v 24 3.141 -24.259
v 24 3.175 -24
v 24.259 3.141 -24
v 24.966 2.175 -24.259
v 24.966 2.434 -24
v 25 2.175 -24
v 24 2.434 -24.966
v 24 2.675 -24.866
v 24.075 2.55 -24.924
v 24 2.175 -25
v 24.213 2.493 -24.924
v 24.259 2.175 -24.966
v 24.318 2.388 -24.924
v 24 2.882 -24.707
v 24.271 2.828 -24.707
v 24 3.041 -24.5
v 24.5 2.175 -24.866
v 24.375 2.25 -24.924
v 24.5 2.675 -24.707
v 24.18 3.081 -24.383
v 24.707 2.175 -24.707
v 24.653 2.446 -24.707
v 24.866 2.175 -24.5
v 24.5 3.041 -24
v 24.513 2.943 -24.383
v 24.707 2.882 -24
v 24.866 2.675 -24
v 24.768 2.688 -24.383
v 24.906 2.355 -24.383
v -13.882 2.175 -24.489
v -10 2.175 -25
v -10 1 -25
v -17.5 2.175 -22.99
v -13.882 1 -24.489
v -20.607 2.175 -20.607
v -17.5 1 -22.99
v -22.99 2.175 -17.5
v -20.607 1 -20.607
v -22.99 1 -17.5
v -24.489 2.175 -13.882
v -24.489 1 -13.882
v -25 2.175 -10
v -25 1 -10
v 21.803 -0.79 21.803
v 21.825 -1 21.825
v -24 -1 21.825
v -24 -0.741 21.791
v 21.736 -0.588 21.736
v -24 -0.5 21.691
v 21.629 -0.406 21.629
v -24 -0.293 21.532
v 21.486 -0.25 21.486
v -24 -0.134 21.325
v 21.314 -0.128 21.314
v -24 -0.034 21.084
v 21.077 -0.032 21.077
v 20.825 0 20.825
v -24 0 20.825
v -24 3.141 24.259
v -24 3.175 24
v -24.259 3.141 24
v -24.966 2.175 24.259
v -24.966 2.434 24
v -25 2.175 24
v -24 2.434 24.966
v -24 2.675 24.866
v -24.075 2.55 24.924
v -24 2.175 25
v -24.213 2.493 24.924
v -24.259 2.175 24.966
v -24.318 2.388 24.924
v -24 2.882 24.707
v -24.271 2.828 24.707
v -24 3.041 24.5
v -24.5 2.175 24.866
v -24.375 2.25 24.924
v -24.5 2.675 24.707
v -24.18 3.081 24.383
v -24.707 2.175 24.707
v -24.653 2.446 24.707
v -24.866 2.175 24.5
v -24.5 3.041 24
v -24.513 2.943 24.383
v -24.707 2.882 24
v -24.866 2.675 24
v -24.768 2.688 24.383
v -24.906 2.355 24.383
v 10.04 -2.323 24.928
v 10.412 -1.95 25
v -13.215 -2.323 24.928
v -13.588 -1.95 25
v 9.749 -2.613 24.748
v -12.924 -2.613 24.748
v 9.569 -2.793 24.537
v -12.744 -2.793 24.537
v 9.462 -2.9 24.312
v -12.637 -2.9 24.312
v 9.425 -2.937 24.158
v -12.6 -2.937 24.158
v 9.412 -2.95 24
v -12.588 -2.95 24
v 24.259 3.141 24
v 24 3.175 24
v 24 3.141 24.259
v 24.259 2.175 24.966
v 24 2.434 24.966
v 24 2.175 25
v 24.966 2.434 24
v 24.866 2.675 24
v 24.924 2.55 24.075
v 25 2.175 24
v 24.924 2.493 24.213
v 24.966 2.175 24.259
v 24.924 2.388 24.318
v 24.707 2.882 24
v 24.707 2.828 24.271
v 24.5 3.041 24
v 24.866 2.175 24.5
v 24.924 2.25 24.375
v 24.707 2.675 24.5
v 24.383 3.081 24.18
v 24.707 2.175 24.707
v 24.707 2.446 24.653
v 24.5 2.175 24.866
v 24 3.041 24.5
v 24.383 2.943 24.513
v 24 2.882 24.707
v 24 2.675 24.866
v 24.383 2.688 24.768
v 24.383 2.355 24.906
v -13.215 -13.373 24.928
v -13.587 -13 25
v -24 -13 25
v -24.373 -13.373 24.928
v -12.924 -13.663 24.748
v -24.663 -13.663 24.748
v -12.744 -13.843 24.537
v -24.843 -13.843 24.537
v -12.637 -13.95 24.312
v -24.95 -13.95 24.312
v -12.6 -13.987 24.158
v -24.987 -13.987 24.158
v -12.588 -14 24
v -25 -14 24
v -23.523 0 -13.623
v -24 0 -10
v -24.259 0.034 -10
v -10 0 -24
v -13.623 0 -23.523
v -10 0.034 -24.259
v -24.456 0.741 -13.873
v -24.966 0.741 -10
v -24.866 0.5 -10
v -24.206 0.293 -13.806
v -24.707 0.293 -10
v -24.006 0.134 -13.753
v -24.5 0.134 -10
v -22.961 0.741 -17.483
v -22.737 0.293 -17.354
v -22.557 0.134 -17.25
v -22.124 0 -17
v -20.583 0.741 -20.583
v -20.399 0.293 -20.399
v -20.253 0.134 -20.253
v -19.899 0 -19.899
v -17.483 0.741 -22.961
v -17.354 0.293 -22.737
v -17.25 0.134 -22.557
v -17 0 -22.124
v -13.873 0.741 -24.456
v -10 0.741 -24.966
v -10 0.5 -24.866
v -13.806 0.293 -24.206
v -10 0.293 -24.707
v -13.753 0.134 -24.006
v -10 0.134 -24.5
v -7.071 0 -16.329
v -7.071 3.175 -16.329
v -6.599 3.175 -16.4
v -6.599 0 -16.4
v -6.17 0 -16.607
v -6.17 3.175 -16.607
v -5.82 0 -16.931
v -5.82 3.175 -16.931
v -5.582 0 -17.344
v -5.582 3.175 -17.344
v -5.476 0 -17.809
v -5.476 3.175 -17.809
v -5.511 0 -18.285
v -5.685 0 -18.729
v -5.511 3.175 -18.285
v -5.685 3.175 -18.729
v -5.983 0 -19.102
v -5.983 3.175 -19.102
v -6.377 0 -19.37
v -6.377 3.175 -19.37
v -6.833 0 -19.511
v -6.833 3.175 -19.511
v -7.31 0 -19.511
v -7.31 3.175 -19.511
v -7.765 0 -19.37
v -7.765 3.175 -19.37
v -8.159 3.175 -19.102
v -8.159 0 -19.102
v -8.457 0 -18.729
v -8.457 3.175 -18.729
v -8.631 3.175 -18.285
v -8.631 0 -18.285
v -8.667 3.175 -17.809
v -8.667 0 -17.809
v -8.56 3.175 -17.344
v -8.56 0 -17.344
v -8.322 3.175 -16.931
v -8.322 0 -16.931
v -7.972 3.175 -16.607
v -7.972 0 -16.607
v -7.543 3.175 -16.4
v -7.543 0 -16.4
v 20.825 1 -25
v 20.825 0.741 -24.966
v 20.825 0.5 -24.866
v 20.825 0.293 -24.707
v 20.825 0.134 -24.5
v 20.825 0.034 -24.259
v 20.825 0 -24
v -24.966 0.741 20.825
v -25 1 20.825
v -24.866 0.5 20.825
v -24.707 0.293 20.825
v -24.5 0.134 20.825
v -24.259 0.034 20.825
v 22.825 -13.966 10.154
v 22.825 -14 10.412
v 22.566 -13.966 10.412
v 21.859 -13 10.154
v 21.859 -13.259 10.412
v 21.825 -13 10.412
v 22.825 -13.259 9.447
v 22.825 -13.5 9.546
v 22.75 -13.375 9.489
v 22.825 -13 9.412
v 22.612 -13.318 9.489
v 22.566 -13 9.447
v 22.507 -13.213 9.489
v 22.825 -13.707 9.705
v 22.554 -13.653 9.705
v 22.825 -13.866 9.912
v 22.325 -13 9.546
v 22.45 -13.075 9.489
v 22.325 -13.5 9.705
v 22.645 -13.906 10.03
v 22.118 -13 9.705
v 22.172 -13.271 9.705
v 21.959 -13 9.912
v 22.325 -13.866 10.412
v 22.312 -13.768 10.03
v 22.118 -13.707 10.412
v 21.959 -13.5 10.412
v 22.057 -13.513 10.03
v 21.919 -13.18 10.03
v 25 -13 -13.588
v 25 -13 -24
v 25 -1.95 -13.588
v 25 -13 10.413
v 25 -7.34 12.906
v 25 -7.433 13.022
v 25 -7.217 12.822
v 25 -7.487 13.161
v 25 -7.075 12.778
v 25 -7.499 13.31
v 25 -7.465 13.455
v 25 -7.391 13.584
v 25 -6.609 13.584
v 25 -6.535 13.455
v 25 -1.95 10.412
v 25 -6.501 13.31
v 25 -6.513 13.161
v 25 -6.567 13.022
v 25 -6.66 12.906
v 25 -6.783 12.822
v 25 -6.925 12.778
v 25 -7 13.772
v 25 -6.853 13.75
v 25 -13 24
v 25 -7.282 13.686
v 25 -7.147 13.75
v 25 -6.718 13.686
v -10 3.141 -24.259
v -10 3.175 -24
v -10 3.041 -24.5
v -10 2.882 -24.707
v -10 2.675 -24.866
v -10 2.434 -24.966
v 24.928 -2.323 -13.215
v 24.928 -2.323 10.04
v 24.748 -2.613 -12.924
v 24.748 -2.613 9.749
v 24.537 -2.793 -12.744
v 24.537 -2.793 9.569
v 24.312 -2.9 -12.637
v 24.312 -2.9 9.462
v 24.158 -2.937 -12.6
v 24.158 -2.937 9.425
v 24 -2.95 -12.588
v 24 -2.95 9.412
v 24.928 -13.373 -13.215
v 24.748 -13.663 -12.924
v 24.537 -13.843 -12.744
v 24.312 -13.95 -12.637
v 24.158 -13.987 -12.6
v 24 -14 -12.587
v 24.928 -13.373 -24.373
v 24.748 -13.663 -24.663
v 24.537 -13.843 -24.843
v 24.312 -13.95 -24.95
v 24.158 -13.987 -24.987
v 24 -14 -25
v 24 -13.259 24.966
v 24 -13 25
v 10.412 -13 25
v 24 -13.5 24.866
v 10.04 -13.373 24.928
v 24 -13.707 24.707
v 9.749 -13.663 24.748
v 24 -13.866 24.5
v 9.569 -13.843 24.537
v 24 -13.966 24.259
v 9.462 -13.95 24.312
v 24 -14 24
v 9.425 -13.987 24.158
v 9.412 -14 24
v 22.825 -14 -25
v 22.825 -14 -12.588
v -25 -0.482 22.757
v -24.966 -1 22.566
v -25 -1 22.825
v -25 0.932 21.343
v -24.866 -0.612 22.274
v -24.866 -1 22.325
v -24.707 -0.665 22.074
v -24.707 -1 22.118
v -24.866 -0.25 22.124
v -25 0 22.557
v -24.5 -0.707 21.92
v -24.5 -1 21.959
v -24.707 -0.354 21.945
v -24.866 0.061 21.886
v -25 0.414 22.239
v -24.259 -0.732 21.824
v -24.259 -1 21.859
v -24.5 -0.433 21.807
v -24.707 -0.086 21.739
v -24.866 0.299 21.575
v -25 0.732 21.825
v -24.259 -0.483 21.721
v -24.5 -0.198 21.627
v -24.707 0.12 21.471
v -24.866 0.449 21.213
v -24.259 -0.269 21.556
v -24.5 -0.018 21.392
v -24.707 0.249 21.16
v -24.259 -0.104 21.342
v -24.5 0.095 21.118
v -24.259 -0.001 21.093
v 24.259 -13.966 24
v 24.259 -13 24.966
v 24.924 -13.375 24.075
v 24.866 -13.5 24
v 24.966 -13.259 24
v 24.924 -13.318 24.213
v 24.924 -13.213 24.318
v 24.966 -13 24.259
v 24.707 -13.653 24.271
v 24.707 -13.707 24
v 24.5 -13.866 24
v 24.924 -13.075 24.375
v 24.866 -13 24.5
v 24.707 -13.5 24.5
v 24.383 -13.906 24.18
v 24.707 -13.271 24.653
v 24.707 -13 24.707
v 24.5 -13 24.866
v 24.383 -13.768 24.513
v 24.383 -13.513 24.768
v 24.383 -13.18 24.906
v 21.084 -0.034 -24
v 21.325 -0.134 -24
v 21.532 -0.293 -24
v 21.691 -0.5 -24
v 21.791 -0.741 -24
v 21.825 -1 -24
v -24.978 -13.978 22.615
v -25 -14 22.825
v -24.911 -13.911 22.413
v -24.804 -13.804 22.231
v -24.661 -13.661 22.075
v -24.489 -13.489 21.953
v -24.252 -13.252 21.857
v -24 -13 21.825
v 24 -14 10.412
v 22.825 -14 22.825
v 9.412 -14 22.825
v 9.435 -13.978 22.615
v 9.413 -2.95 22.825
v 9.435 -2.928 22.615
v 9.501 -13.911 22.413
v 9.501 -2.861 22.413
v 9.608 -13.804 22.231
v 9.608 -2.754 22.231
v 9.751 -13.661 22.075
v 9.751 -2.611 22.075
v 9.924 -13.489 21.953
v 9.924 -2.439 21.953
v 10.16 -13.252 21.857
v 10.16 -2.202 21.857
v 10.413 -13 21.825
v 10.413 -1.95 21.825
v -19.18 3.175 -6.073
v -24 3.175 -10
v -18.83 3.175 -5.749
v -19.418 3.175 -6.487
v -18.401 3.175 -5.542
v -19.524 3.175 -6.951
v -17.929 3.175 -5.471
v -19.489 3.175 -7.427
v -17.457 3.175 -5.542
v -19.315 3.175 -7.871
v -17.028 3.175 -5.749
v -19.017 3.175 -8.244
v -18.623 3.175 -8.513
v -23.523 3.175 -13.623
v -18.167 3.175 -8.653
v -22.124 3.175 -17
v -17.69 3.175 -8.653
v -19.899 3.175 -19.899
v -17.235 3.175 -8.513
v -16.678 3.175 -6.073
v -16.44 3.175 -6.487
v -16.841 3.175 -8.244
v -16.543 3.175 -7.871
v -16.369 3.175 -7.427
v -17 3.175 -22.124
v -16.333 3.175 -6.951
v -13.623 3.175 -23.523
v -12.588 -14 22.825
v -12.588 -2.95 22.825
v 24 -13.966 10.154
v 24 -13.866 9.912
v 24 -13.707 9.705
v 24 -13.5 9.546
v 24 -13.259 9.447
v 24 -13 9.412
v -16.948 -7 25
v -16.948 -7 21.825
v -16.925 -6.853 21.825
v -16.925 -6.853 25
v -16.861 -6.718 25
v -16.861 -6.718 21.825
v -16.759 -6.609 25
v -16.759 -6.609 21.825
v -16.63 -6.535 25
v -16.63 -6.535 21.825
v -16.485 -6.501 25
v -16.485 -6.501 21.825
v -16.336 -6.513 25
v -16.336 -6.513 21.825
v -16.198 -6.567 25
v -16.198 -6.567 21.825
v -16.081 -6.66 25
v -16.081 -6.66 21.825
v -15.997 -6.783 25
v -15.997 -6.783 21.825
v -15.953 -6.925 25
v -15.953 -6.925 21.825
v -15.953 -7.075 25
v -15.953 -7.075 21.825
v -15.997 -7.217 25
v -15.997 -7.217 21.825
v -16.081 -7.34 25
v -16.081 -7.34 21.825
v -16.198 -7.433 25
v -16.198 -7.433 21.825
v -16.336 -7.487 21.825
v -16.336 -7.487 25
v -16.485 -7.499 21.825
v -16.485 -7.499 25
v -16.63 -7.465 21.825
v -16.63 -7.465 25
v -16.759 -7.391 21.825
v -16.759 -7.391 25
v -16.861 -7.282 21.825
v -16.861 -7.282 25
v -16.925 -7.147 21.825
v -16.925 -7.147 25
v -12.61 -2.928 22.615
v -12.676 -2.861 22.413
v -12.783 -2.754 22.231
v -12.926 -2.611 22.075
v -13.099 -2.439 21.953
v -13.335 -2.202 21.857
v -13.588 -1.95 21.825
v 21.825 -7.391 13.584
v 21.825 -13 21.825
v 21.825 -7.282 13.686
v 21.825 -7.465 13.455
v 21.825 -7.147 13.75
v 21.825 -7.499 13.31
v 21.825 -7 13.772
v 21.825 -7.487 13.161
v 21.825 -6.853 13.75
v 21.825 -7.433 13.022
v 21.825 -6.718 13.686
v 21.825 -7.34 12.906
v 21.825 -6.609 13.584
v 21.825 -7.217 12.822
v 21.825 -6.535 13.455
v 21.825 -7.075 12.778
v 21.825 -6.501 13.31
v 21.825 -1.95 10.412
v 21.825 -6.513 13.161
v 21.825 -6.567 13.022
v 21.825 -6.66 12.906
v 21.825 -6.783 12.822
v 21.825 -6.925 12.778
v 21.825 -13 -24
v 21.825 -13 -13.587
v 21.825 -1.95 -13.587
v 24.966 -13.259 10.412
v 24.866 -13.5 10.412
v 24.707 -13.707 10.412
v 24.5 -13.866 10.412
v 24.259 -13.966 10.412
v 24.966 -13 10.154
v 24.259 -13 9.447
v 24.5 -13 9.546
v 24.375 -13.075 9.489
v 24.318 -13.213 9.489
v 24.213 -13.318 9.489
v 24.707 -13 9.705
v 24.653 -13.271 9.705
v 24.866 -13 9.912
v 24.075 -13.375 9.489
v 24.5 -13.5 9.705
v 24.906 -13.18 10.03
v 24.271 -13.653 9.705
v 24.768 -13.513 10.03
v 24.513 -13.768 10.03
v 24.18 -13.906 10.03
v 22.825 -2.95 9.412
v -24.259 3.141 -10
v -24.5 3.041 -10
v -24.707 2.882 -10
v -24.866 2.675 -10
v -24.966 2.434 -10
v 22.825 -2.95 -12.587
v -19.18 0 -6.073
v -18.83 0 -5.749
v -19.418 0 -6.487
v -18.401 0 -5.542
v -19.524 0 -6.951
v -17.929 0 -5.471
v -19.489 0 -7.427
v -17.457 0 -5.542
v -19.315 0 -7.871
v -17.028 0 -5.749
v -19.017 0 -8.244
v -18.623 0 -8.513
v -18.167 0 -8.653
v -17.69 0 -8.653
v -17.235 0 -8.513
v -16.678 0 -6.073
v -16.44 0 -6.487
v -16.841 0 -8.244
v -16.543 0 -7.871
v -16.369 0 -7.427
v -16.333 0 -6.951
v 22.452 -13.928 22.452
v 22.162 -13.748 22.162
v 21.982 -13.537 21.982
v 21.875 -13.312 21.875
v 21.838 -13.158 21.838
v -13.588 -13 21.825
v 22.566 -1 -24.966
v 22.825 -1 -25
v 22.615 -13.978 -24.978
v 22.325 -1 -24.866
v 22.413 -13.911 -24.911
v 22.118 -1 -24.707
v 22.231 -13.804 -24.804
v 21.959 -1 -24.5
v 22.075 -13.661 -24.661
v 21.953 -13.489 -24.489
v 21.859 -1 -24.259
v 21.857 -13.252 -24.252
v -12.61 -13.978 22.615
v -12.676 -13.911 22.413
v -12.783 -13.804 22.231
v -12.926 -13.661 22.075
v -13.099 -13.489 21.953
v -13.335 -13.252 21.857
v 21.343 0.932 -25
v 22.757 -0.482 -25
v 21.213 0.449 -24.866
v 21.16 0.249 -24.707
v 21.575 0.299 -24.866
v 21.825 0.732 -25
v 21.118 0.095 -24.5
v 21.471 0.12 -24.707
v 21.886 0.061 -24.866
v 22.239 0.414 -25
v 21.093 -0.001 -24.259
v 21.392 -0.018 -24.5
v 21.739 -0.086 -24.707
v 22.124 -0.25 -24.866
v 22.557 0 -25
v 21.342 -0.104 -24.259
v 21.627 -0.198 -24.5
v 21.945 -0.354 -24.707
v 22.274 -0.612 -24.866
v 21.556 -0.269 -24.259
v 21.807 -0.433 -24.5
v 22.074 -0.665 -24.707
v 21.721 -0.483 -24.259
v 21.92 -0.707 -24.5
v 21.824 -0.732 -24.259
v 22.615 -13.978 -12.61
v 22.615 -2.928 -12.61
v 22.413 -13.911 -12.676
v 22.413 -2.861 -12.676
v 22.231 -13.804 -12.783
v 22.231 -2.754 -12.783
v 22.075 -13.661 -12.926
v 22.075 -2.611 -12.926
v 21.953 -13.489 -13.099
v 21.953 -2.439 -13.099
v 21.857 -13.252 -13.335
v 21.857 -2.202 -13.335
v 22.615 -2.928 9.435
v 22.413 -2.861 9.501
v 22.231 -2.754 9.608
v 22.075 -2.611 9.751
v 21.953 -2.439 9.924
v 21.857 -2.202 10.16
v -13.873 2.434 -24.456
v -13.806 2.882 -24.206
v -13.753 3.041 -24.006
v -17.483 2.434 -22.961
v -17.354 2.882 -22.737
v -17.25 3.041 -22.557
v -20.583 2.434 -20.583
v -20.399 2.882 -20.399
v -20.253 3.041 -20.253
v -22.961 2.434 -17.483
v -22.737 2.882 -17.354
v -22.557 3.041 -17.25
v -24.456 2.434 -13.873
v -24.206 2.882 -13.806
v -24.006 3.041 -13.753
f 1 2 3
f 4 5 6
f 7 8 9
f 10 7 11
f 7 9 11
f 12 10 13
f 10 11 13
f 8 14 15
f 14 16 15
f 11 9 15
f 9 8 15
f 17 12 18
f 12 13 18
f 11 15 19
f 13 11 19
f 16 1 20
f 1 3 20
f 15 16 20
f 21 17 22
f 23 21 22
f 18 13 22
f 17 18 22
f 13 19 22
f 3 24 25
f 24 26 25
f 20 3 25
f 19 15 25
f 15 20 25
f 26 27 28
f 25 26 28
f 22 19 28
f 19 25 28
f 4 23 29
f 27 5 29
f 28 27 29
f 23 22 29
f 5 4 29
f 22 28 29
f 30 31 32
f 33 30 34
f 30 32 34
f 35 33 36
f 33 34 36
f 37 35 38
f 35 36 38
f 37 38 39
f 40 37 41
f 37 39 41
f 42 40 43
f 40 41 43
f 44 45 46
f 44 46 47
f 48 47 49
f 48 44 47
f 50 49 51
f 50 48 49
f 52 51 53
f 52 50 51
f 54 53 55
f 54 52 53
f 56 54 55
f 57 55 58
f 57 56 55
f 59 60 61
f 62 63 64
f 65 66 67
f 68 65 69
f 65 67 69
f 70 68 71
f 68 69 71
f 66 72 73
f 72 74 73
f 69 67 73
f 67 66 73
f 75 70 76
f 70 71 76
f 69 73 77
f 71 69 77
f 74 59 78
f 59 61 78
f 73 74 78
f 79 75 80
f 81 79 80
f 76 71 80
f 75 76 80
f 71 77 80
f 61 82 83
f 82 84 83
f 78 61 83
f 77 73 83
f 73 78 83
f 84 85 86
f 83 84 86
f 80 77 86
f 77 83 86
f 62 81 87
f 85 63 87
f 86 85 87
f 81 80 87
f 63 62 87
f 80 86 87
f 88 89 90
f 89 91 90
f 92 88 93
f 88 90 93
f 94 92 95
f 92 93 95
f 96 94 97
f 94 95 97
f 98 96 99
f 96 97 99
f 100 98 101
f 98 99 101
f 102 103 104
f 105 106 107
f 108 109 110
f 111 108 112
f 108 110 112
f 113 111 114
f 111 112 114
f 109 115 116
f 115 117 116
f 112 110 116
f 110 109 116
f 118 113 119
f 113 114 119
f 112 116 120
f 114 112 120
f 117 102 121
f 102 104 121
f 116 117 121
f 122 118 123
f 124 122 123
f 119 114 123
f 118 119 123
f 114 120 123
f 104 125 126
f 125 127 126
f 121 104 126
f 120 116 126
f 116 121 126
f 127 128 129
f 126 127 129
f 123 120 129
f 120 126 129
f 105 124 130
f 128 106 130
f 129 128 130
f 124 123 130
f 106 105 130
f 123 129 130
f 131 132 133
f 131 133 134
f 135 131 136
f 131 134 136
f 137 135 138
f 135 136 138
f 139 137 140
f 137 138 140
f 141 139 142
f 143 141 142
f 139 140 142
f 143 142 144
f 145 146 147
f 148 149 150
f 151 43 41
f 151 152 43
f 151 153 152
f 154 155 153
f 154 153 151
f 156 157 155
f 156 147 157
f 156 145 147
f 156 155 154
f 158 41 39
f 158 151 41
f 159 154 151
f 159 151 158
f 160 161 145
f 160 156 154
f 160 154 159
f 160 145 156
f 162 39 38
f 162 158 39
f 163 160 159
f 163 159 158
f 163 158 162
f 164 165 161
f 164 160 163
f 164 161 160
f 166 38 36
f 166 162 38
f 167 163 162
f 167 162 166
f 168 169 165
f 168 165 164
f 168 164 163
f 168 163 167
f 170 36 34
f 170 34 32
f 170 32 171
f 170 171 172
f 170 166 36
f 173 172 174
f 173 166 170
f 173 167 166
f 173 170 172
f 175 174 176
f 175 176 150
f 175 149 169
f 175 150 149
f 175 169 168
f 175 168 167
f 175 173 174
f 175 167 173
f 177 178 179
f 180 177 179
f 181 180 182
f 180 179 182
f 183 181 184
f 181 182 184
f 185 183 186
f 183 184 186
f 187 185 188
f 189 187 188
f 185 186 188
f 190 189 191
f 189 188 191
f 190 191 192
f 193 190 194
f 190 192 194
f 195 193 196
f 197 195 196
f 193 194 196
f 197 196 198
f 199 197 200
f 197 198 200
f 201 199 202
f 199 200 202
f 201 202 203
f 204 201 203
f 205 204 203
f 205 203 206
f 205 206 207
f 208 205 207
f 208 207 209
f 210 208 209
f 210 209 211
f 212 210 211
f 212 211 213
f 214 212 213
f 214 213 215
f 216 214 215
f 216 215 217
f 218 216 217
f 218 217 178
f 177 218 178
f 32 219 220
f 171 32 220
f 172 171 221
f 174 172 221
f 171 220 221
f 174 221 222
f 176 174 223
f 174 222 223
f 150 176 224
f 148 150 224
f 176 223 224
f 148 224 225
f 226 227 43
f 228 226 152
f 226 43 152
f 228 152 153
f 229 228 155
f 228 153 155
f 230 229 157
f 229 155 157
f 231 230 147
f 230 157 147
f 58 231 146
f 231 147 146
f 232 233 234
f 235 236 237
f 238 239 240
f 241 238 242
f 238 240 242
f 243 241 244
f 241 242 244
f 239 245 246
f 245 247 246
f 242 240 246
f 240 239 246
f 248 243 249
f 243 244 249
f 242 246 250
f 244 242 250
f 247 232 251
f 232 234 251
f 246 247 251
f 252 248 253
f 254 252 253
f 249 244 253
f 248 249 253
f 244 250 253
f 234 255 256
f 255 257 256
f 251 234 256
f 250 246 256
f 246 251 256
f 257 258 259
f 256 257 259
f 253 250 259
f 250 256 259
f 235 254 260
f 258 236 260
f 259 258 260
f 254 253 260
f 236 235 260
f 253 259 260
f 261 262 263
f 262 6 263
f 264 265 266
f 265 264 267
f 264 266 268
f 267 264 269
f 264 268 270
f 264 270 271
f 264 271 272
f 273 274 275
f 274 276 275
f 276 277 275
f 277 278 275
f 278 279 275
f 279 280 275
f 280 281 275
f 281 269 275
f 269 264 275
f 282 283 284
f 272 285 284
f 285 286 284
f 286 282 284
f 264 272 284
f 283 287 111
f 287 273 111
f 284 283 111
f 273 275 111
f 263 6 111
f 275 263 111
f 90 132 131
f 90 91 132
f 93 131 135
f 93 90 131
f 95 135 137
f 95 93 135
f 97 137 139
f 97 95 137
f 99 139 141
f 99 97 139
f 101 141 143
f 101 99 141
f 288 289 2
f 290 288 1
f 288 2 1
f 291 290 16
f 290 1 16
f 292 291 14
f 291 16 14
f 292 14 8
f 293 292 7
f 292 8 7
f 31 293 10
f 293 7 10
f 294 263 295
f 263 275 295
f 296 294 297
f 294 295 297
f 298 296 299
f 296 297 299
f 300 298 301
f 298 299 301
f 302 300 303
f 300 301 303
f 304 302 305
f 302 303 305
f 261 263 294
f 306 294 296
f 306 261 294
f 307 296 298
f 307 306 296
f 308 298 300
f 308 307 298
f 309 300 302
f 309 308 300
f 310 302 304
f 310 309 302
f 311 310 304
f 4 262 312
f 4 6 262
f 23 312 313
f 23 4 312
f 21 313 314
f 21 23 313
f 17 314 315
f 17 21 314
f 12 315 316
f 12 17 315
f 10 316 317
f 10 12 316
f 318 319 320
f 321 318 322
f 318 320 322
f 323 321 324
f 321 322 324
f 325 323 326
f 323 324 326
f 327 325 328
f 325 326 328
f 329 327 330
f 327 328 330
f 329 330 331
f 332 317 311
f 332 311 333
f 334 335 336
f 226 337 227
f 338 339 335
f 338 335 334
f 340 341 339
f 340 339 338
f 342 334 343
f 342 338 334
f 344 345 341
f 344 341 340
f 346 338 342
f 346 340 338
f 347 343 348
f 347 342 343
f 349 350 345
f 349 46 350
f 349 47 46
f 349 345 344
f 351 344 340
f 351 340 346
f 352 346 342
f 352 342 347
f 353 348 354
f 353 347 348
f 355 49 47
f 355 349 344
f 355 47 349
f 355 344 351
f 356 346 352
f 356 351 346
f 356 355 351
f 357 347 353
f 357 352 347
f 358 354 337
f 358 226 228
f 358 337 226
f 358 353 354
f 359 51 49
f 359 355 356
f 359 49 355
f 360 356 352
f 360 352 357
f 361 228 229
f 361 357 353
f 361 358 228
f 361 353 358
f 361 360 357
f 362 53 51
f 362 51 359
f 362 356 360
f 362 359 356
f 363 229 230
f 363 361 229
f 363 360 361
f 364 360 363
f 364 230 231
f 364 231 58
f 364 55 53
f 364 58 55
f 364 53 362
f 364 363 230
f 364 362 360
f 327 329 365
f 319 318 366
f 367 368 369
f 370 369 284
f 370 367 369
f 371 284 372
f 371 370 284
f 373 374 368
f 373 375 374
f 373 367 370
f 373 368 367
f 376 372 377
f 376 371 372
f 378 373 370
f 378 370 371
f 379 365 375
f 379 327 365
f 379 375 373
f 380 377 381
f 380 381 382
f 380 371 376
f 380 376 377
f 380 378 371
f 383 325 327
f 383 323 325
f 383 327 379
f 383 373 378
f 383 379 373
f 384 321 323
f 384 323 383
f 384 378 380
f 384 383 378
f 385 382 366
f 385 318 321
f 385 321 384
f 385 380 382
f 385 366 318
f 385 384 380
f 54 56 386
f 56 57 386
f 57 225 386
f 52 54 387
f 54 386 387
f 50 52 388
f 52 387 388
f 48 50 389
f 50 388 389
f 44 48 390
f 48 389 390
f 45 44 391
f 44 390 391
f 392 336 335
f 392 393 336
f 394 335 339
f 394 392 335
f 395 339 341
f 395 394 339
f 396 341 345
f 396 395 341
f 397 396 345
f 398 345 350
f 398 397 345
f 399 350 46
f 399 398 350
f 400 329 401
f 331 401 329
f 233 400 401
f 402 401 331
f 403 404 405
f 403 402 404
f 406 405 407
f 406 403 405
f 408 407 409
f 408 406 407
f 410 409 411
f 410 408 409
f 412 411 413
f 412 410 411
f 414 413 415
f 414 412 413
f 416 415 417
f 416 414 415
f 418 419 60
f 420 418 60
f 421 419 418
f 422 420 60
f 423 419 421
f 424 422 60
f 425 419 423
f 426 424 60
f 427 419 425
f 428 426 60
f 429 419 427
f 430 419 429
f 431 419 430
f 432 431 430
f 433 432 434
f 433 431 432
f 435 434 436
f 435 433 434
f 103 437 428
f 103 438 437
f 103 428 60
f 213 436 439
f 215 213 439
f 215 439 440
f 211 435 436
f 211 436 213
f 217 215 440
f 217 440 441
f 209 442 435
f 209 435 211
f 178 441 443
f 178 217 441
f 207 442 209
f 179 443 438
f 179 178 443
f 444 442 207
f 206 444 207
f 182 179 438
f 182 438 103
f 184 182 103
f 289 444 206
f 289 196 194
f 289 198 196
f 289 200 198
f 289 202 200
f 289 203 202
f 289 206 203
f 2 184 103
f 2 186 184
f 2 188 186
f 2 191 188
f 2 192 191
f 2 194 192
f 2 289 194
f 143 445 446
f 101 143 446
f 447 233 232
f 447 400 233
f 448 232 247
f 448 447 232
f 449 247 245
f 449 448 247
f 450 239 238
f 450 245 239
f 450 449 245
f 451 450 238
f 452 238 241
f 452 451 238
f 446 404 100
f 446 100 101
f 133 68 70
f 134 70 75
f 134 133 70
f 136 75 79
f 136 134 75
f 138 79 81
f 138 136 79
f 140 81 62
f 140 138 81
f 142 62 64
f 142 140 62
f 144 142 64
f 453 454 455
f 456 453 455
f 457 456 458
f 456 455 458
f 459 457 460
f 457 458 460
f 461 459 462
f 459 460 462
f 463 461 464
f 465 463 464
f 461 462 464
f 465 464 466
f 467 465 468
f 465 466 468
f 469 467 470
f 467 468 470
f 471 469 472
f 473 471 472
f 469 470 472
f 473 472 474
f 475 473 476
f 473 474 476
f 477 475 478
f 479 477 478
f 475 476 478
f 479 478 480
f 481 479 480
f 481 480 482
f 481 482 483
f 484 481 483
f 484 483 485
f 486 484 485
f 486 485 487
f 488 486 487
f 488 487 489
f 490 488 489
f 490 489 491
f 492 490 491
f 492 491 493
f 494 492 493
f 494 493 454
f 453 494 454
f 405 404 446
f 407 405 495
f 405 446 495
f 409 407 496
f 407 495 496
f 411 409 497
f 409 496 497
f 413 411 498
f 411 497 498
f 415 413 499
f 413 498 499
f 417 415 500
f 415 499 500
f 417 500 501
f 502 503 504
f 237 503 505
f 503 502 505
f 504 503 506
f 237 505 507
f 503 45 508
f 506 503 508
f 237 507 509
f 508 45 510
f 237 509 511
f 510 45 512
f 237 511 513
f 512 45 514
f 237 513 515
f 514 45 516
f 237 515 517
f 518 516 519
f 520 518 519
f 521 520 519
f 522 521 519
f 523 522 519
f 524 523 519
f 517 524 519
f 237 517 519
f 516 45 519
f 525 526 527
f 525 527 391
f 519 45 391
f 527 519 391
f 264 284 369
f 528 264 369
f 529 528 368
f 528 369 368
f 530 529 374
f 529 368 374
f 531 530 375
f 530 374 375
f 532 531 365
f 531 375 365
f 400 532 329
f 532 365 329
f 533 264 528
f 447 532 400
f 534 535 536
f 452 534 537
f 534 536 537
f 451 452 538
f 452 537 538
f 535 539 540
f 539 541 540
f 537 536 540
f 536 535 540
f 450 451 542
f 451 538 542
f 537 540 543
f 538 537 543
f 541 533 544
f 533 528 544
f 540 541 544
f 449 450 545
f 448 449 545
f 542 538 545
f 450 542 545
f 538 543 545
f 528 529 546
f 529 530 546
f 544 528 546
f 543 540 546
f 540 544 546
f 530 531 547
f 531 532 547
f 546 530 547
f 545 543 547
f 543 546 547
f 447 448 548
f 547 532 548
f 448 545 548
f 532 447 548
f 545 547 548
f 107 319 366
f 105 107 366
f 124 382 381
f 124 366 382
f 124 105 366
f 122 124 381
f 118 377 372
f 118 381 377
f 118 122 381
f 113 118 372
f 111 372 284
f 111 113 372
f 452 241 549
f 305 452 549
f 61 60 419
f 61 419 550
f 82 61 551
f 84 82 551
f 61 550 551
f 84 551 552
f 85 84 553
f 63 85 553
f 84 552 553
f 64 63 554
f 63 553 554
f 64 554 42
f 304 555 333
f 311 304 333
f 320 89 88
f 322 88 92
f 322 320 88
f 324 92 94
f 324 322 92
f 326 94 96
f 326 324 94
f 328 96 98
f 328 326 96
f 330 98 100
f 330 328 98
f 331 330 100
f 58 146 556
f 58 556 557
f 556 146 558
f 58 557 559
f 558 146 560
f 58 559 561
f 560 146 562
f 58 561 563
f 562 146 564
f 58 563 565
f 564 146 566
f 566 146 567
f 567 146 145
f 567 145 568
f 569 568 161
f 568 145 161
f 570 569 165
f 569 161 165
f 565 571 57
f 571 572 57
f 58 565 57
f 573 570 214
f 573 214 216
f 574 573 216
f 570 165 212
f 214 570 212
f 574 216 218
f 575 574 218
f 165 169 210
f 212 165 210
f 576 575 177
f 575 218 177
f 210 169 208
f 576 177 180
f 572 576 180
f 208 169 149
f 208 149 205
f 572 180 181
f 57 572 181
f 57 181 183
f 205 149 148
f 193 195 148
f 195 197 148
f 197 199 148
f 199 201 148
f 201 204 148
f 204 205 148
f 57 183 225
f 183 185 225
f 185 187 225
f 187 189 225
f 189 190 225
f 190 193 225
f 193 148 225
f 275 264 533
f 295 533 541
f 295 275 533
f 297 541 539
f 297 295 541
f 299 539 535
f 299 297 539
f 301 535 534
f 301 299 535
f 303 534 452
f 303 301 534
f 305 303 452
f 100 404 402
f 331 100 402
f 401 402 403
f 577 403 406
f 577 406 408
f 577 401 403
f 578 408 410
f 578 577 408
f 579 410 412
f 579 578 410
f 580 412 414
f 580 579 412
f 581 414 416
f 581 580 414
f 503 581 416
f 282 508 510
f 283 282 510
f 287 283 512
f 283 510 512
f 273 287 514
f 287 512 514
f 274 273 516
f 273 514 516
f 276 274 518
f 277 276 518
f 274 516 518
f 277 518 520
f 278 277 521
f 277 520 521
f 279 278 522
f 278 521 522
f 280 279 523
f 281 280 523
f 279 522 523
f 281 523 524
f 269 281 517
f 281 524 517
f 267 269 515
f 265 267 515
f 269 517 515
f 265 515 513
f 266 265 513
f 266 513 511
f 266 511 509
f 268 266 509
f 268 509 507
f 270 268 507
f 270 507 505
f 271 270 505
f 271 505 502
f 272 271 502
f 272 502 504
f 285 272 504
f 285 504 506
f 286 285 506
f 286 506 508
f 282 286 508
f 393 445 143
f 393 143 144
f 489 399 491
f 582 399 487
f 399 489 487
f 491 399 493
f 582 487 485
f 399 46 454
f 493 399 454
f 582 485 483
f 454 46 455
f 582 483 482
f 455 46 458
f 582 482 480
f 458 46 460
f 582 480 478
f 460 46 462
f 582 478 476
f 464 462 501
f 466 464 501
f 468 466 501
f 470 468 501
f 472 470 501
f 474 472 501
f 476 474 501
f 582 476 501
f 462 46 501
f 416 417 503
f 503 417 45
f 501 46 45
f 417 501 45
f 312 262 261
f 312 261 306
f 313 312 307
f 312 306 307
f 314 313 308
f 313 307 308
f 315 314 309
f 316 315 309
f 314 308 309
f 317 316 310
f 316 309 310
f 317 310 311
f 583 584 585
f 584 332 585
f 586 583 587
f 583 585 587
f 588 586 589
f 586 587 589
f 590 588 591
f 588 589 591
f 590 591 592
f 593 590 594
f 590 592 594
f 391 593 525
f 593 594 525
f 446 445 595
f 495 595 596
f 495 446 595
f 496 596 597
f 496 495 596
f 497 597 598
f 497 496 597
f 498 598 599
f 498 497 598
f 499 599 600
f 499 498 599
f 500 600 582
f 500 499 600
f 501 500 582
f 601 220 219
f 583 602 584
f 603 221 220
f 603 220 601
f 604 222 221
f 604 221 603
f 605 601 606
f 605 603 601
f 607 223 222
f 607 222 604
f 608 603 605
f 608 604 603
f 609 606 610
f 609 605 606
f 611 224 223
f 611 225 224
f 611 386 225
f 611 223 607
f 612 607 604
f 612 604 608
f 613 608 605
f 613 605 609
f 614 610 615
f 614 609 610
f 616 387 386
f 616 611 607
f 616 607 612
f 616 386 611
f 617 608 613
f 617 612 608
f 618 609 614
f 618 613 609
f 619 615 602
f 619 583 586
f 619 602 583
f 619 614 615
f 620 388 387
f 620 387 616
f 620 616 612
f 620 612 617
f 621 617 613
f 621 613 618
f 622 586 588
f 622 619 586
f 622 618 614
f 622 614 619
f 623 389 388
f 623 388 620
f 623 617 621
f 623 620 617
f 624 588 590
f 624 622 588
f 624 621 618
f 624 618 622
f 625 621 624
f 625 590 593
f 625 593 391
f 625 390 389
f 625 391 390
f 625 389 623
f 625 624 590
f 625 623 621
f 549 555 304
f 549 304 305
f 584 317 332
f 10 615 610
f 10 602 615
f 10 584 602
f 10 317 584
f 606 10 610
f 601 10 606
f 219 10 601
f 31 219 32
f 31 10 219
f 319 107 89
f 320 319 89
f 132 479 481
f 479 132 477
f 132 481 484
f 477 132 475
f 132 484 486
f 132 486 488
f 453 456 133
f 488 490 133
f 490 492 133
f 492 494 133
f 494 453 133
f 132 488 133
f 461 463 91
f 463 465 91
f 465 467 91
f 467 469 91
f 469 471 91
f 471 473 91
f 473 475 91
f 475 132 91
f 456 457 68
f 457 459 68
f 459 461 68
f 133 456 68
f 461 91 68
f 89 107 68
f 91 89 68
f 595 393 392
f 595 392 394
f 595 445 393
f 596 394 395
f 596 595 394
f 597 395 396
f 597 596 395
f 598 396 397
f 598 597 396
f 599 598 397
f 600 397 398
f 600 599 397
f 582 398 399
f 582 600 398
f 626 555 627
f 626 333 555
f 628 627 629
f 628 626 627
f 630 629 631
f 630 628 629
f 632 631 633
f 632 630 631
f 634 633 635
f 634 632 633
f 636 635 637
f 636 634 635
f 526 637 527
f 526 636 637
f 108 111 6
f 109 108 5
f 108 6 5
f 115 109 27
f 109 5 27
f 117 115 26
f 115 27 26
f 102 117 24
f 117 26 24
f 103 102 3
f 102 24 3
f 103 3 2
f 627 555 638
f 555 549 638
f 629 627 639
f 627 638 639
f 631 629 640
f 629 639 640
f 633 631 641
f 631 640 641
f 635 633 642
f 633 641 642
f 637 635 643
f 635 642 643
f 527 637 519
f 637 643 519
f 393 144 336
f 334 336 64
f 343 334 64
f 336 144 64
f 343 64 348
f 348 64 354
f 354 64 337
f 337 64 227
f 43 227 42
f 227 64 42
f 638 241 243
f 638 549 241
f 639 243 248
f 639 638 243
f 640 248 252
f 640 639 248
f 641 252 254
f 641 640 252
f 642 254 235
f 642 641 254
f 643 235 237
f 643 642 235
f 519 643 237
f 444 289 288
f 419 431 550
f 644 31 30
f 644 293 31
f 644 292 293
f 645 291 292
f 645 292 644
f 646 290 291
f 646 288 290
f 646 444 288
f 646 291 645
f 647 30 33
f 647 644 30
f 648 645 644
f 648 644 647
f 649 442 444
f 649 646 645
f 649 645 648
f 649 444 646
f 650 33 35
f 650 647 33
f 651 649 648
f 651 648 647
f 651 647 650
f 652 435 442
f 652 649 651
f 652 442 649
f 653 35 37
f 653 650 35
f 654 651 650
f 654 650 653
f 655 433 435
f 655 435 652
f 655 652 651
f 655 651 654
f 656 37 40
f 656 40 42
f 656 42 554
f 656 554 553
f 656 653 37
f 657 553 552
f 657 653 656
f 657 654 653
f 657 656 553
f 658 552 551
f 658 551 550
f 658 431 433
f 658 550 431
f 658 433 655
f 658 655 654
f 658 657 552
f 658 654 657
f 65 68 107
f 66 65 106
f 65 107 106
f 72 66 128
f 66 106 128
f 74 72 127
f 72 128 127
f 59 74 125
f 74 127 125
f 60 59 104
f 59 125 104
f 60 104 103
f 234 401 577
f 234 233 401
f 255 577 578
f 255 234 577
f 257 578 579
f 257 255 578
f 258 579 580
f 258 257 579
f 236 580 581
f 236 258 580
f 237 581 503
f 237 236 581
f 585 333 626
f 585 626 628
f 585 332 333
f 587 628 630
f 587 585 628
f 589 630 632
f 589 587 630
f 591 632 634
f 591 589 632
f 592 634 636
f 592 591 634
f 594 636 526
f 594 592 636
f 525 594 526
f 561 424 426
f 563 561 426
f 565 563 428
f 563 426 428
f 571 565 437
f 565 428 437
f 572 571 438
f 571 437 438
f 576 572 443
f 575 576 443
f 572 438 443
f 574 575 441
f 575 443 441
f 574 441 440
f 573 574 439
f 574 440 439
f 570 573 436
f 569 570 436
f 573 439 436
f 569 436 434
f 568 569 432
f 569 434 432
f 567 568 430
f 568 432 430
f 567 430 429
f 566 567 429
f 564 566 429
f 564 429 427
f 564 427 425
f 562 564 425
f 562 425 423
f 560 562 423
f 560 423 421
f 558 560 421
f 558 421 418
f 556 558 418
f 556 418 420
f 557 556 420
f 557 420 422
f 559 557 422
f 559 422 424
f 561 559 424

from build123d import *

# Parameters (mm, degrees)
SKETCH1_W           = 50
SKETCH1_H           = 50
BOSS_EXTRUDE1_DEPTH = 3.175
SKETCH2_W           = 3.175
SKETCH2_H           = 46.825
BOSS_EXTRUDE2_DEPTH = 14
SKETCH3_W           = 22
SKETCH3_H           = 8.1
SKETCH3_H_2         = 2.95
SKETCH3_R           = 0.5
CUT_EXTRUDE1_DEPTH  = 55.896089342
SKETCH4_W           = 22
SKETCH4_H           = 8.1
SKETCH4_H_2         = 2.95
SKETCH4_R           = 0.5
CUT_EXTRUDE2_DEPTH  = 55.896089342
SKETCH5_R           = 1.6
CUT_EXTRUDE3_DEPTH  = 40.306241553
FILLET1_R           = 1
FILLET2_R           = 15


with BuildPart() as part:
    # Sketch1 → Boss-Extrude1 (new body)
    with BuildSketch(Plane(origin=(0, 0, 0), x_dir=(1, 0, 0), z_dir=(0, 1, 0))):
        Rectangle(SKETCH1_W, SKETCH1_H)
    extrude(amount=BOSS_EXTRUDE1_DEPTH)

    # Sketch2 → Boss-Extrude2 (add)
    with BuildSketch(Plane(origin=(0, 0, 0), x_dir=(-1, 0, 0), z_dir=(0, -1, 0))):
        Polygon((-25, -25), (25, -25), (25, -21.825), (-21.825, -21.825), (-25, -21.825), align=None)
        with Locations((-23.4125, 1.5875)):
            Rectangle(SKETCH2_W, SKETCH2_H)
    extrude(amount=BOSS_EXTRUDE2_DEPTH)

    # Sketch3 → Cut-Extrude1 (cut, through all)
    with BuildSketch(Plane(origin=(0, 0, 21.825), x_dir=(-1, 0, 0), z_dir=(0, 0, -1))):
        with Locations((1.5875, -7)):
            Rectangle(SKETCH3_W, SKETCH3_H)
        with Locations((1.5875, -12.525)):
            Rectangle(SKETCH3_W, SKETCH3_H_2)
        with Locations((16.4475, -7)):
            Circle(SKETCH3_R)
    extrude(amount=-CUT_EXTRUDE1_DEPTH, mode=Mode.SUBTRACT)

    # Sketch4 → Cut-Extrude2 (cut, through all)
    with BuildSketch(Plane.ZY.offset(-21.825)):
        with Locations((-1.5875, -7)):
            Rectangle(SKETCH4_W, SKETCH4_H)
        with Locations((-1.5875, -12.525)):
            Rectangle(SKETCH4_W, SKETCH4_H_2)
        with Locations((13.2725, -7)):
            Circle(SKETCH4_R)
    extrude(amount=-CUT_EXTRUDE2_DEPTH, mode=Mode.SUBTRACT)

    # Sketch5 → Cut-Extrude3 (cut, through all)
    with BuildSketch(Plane(origin=(0, 3.175, 0), x_dir=(1, 0, 0), z_dir=(0, 1, 0))):
        with Locations(Location((-7.071067812, 17.928932188, 0), (0, 0, 270))):
            Circle(SKETCH5_R)
        with Locations(Location((-17.928932188, 7.071067812, 0), (0, 0, 270))):
            Circle(SKETCH5_R)
    extrude(amount=-CUT_EXTRUDE3_DEPTH, mode=Mode.SUBTRACT)

    # Fillet1
    fillet1_edges = [part.edges().sort_by_distance(p)[0] for p in [
        (-25, 3.175, 0),
        (0, 3.175, 25),
        (-1.5875, 0, -25),
        (-1.5875, 0, 21.825),
        (-25, -7, 21.825),
        (21.825, -14, -18.79375),
        (21.825, -7, -25),
        (-18.79375, -14, 21.825),
        (25, -14, -18.79375),
        (17.20625, -14, 25),
        (21.825, 0, -1.5875),
        (15.61875, -14, 21.825),
        (-18.79375, -14, 25),
        (25, 3.175, 0),
        (9.4125, -8.475, 21.825),
        (-1.5875, -2.95, 25),
        (-12.5875, -8.475, 25),
        (9.4125, -8.475, 25),
        (-12.5875, -8.475, 21.825),
        (-1.5875, -2.95, 21.825),
        (-25, 0, -1.5875),
        (21.825, -14, 15.61875),
        (25, -14, 17.20625),
        (21.825, -8.475, -12.5875),
        (25, -2.95, -1.5875),
        (25, -8.475, 9.4125),
        (23.4125, -14, 9.4125),
        (25, -8.475, -12.5875),
        (21.825, -8.475, 9.4125),
        (21.825, -2.95, -1.5875),
        (0, 3.175, -25),
        (25, -5.4125, 25),
        (-25, -5.4125, 25),
        (25, -5.4125, -25),
    ]]
    fillet(fillet1_edges, radius=FILLET1_R)

    # Fillet2
    # the kernel refuses this fillet: 15 mm, written as the material it takes off along each edge
    with BuildSketch(Plane(origin=(-10, 3.175, -10), x_dir=(0, 0, -1), z_dir=(1, 0, 0))) as fillet2_piece_1:
        with BuildLine():
            CenterArc((14, -1), 1, 0, 90)
            Line((15, -1), (15, 0))
            Line((15, 0), (14, 0))
        make_face()
    revolve(axis=Axis((-10, 3.175, -10), (0, 1, 0)), revolution_arc=90, mode=Mode.SUBTRACT)
    with BuildSketch(Plane(origin=(-10, 0, -10), x_dir=(-1, 0, 0), z_dir=(0, 0, 1))) as fillet2_piece_2:
        with BuildLine():
            CenterArc((14, -1), 1, 0, 90)
            Line((15, -1), (15, 0))
            Line((15, 0), (14, 0))
        make_face()
    revolve(axis=Axis((-10, 0, -10), (0, -1, 0)), revolution_arc=90, mode=Mode.SUBTRACT)
    with BuildSketch(Plane(origin=(-25, 0, -25), x_dir=(1, 0, 0), z_dir=(0, 1, 0))) as fillet2_piece_3:
        with BuildLine():
            CenterArc((FILLET2_R, -FILLET2_R), FILLET2_R, 90, 90)
            Line((0, -FILLET2_R), (0, 0))
            Line((0, 0), (FILLET2_R, 0))
        make_face()
    extrude(amount=3.175, mode=Mode.SUBTRACT)


solid = part.part
